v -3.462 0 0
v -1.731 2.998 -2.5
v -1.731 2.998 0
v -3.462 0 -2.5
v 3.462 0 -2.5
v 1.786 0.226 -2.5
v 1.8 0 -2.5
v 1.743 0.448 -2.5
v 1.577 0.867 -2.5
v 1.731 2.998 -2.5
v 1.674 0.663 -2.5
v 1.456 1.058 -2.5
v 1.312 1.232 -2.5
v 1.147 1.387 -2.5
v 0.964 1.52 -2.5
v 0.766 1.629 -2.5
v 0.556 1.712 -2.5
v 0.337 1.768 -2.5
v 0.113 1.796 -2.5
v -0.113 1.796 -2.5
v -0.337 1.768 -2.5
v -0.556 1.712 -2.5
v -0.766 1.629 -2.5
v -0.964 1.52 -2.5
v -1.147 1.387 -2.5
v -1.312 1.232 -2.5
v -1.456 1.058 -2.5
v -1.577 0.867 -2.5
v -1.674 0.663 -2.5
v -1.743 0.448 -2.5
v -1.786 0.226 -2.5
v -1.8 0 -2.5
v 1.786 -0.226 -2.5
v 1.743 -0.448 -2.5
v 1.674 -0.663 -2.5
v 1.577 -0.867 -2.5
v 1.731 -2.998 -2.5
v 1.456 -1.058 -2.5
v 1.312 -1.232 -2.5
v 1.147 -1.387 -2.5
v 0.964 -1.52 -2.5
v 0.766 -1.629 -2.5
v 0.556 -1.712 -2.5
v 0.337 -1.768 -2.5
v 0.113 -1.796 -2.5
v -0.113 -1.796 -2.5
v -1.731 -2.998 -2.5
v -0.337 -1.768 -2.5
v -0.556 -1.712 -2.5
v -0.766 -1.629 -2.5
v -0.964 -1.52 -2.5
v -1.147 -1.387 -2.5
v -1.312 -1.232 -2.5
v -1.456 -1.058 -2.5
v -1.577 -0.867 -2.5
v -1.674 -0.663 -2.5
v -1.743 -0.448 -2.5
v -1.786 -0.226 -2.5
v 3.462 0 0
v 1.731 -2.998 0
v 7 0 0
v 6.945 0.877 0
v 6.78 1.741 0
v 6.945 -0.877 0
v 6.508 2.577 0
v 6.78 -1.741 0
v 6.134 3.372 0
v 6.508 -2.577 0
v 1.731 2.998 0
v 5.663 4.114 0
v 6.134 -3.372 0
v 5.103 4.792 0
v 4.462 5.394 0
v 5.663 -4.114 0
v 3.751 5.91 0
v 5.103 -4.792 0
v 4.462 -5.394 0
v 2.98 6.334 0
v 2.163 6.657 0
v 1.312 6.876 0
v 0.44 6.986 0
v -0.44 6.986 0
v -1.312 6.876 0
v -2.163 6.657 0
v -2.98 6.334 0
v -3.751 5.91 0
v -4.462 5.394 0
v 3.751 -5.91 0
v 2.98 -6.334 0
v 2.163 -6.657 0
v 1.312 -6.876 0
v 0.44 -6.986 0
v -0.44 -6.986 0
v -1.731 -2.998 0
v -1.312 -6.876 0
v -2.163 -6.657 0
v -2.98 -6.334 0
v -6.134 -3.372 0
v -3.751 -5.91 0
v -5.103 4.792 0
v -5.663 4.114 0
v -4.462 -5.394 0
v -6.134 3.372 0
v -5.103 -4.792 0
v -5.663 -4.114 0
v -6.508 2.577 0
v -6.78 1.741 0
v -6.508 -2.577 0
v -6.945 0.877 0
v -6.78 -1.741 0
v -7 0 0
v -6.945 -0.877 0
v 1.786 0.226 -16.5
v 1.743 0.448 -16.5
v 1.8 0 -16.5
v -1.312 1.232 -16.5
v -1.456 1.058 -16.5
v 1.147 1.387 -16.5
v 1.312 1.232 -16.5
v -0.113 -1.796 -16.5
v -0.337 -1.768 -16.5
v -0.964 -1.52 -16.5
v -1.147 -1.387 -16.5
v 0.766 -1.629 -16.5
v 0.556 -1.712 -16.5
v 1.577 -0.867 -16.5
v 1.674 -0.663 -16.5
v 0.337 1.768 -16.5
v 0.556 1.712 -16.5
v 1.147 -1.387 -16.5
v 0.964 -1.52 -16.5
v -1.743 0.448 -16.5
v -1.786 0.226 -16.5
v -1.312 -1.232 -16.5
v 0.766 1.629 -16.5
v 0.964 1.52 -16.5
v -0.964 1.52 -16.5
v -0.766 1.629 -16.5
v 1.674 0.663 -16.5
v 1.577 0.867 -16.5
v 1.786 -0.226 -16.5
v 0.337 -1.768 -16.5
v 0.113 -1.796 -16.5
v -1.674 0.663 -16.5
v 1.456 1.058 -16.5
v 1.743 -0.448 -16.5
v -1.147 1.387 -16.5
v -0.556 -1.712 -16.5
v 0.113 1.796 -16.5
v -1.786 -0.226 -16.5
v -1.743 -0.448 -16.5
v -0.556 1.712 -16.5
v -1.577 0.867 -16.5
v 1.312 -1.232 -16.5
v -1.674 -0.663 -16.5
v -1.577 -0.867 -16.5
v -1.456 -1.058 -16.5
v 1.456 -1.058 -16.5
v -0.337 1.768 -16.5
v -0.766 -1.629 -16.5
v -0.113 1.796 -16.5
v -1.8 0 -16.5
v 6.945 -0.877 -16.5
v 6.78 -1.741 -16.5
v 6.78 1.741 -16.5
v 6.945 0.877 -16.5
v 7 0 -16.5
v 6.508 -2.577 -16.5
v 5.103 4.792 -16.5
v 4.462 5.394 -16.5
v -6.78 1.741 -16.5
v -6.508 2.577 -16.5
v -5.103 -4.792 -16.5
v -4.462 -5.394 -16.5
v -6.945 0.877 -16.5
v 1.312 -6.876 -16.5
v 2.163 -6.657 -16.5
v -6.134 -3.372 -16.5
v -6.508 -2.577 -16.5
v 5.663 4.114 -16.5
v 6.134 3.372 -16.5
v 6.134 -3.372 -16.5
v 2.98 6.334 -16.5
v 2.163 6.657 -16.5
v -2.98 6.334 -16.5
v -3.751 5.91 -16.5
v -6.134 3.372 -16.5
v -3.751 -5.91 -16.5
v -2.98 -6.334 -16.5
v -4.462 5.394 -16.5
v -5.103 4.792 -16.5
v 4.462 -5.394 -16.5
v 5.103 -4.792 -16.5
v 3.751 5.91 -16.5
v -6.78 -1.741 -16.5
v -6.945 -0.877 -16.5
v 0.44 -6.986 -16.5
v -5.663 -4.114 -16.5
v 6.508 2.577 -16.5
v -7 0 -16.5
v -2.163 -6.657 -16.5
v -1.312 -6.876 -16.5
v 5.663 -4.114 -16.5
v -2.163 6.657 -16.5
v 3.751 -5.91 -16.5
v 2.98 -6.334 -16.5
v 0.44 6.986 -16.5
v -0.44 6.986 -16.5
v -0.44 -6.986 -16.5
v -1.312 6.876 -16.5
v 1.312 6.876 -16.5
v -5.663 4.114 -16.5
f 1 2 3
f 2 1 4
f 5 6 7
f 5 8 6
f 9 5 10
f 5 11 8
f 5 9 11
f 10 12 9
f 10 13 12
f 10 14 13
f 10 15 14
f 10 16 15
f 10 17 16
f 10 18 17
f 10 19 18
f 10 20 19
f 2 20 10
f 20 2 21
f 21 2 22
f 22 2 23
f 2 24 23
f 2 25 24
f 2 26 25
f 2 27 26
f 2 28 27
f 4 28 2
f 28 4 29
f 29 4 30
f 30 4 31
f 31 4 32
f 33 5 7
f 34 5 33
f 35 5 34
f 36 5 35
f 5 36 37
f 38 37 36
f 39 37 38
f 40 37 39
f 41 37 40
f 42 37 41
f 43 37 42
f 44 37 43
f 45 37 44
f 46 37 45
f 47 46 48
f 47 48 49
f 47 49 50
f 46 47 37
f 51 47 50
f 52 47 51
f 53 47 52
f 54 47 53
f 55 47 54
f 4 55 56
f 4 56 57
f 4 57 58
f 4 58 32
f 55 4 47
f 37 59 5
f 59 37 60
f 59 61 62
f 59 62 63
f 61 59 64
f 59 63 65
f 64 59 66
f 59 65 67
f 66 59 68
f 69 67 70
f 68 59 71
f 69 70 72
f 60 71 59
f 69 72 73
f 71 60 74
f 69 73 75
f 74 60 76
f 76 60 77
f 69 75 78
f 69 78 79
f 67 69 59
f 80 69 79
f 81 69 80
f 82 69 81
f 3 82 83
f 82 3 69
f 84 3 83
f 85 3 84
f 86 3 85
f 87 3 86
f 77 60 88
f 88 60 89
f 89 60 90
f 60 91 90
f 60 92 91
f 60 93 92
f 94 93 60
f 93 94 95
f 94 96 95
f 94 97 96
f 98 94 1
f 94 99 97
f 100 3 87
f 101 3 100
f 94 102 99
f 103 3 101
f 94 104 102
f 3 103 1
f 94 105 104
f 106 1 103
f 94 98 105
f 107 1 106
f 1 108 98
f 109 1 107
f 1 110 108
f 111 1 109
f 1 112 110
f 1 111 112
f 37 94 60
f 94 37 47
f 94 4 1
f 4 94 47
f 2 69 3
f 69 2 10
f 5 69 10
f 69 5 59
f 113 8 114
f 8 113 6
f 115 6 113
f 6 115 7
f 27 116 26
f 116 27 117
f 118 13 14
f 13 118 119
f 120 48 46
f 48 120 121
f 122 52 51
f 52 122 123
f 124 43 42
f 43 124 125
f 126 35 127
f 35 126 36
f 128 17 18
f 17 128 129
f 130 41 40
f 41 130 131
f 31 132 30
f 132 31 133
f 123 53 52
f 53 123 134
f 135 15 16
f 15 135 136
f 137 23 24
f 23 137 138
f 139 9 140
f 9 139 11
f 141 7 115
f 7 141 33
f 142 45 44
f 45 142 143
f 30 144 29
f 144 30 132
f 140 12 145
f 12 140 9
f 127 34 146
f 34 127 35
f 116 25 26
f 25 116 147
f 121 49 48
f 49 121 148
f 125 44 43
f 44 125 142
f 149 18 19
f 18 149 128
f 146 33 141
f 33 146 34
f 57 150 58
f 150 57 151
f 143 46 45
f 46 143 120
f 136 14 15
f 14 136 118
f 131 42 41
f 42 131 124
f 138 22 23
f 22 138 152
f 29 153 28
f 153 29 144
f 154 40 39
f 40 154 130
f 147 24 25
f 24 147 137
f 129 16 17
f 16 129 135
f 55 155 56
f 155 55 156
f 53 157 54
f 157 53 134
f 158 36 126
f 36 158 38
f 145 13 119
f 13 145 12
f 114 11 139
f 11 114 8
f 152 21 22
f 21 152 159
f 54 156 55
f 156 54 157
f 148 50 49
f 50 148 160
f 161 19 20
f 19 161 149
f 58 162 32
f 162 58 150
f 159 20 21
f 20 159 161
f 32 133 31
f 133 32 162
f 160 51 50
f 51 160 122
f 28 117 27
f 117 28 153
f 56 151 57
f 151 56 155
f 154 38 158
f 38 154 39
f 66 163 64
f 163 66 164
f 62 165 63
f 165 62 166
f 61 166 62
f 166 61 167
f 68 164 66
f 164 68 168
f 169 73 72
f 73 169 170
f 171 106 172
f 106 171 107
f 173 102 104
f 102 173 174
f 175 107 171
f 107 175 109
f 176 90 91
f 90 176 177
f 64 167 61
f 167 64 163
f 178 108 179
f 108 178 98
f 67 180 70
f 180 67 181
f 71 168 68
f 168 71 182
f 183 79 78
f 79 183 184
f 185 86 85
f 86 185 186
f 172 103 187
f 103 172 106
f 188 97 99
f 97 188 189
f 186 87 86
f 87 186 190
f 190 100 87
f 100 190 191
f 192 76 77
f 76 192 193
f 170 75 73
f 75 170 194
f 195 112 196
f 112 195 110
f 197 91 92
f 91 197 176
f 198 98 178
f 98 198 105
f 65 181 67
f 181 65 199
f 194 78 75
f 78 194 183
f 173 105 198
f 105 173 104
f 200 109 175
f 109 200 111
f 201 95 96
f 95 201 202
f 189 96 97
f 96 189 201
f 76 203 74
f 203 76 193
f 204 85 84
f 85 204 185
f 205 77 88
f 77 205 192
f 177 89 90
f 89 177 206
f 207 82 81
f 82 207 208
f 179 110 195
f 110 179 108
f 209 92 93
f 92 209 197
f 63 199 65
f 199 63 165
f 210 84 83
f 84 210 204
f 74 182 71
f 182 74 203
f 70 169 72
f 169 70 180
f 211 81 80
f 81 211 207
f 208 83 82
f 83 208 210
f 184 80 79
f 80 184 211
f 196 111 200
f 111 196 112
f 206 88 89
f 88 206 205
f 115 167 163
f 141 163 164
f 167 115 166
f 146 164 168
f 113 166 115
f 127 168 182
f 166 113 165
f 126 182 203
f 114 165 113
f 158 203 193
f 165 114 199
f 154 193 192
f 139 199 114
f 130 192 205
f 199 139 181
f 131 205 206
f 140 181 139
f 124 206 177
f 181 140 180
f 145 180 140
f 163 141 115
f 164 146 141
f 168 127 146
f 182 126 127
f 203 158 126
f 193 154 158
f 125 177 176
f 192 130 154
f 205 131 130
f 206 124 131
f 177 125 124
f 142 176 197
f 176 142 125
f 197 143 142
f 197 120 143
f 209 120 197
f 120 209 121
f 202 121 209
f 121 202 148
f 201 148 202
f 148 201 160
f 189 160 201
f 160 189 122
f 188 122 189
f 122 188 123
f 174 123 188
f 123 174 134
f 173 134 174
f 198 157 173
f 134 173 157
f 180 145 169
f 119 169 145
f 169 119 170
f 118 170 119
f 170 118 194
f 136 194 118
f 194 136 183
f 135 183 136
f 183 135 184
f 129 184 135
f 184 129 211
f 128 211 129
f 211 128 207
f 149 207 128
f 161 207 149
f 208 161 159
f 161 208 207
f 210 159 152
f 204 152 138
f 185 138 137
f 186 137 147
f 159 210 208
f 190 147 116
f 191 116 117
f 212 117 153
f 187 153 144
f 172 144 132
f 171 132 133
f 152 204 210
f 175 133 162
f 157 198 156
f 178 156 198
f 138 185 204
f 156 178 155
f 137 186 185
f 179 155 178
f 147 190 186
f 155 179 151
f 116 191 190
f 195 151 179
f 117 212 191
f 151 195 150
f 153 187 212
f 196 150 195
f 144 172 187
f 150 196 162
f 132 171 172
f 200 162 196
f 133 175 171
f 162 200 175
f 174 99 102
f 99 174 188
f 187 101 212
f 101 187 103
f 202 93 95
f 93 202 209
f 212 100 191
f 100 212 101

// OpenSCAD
$fn = 50;


difference() {
	union() {
		translate(v = [0, 0, -16.5000000000]) {
			cylinder(h = 16.5000000000, r = 7.0000000000);
		}
	}
	union() {
		translate(v = [0, 0, 0]) {
			rotate(a = [0, 0, 0]) {
				difference() {
					union() {
						translate(v = [0, 0, -2.5000000000]) {
							linear_extrude(height = 2.5000000000) {
								polygon(points = [[3.4620000000, 0.0000000000], [1.7310000000, 2.9981799479], [-1.7310000000, 2.9981799479], [-3.4620000000, 0.0000000000], [-1.7310000000, -2.9981799479], [1.7310000000, -2.9981799479]]);
							}
						}
					}
					union();
				}
			}
		}
		#translate(v = [0, 0, -100.0000000000]) {
			cylinder(h = 200, r = 1.8000000000);
		}
	}
}
